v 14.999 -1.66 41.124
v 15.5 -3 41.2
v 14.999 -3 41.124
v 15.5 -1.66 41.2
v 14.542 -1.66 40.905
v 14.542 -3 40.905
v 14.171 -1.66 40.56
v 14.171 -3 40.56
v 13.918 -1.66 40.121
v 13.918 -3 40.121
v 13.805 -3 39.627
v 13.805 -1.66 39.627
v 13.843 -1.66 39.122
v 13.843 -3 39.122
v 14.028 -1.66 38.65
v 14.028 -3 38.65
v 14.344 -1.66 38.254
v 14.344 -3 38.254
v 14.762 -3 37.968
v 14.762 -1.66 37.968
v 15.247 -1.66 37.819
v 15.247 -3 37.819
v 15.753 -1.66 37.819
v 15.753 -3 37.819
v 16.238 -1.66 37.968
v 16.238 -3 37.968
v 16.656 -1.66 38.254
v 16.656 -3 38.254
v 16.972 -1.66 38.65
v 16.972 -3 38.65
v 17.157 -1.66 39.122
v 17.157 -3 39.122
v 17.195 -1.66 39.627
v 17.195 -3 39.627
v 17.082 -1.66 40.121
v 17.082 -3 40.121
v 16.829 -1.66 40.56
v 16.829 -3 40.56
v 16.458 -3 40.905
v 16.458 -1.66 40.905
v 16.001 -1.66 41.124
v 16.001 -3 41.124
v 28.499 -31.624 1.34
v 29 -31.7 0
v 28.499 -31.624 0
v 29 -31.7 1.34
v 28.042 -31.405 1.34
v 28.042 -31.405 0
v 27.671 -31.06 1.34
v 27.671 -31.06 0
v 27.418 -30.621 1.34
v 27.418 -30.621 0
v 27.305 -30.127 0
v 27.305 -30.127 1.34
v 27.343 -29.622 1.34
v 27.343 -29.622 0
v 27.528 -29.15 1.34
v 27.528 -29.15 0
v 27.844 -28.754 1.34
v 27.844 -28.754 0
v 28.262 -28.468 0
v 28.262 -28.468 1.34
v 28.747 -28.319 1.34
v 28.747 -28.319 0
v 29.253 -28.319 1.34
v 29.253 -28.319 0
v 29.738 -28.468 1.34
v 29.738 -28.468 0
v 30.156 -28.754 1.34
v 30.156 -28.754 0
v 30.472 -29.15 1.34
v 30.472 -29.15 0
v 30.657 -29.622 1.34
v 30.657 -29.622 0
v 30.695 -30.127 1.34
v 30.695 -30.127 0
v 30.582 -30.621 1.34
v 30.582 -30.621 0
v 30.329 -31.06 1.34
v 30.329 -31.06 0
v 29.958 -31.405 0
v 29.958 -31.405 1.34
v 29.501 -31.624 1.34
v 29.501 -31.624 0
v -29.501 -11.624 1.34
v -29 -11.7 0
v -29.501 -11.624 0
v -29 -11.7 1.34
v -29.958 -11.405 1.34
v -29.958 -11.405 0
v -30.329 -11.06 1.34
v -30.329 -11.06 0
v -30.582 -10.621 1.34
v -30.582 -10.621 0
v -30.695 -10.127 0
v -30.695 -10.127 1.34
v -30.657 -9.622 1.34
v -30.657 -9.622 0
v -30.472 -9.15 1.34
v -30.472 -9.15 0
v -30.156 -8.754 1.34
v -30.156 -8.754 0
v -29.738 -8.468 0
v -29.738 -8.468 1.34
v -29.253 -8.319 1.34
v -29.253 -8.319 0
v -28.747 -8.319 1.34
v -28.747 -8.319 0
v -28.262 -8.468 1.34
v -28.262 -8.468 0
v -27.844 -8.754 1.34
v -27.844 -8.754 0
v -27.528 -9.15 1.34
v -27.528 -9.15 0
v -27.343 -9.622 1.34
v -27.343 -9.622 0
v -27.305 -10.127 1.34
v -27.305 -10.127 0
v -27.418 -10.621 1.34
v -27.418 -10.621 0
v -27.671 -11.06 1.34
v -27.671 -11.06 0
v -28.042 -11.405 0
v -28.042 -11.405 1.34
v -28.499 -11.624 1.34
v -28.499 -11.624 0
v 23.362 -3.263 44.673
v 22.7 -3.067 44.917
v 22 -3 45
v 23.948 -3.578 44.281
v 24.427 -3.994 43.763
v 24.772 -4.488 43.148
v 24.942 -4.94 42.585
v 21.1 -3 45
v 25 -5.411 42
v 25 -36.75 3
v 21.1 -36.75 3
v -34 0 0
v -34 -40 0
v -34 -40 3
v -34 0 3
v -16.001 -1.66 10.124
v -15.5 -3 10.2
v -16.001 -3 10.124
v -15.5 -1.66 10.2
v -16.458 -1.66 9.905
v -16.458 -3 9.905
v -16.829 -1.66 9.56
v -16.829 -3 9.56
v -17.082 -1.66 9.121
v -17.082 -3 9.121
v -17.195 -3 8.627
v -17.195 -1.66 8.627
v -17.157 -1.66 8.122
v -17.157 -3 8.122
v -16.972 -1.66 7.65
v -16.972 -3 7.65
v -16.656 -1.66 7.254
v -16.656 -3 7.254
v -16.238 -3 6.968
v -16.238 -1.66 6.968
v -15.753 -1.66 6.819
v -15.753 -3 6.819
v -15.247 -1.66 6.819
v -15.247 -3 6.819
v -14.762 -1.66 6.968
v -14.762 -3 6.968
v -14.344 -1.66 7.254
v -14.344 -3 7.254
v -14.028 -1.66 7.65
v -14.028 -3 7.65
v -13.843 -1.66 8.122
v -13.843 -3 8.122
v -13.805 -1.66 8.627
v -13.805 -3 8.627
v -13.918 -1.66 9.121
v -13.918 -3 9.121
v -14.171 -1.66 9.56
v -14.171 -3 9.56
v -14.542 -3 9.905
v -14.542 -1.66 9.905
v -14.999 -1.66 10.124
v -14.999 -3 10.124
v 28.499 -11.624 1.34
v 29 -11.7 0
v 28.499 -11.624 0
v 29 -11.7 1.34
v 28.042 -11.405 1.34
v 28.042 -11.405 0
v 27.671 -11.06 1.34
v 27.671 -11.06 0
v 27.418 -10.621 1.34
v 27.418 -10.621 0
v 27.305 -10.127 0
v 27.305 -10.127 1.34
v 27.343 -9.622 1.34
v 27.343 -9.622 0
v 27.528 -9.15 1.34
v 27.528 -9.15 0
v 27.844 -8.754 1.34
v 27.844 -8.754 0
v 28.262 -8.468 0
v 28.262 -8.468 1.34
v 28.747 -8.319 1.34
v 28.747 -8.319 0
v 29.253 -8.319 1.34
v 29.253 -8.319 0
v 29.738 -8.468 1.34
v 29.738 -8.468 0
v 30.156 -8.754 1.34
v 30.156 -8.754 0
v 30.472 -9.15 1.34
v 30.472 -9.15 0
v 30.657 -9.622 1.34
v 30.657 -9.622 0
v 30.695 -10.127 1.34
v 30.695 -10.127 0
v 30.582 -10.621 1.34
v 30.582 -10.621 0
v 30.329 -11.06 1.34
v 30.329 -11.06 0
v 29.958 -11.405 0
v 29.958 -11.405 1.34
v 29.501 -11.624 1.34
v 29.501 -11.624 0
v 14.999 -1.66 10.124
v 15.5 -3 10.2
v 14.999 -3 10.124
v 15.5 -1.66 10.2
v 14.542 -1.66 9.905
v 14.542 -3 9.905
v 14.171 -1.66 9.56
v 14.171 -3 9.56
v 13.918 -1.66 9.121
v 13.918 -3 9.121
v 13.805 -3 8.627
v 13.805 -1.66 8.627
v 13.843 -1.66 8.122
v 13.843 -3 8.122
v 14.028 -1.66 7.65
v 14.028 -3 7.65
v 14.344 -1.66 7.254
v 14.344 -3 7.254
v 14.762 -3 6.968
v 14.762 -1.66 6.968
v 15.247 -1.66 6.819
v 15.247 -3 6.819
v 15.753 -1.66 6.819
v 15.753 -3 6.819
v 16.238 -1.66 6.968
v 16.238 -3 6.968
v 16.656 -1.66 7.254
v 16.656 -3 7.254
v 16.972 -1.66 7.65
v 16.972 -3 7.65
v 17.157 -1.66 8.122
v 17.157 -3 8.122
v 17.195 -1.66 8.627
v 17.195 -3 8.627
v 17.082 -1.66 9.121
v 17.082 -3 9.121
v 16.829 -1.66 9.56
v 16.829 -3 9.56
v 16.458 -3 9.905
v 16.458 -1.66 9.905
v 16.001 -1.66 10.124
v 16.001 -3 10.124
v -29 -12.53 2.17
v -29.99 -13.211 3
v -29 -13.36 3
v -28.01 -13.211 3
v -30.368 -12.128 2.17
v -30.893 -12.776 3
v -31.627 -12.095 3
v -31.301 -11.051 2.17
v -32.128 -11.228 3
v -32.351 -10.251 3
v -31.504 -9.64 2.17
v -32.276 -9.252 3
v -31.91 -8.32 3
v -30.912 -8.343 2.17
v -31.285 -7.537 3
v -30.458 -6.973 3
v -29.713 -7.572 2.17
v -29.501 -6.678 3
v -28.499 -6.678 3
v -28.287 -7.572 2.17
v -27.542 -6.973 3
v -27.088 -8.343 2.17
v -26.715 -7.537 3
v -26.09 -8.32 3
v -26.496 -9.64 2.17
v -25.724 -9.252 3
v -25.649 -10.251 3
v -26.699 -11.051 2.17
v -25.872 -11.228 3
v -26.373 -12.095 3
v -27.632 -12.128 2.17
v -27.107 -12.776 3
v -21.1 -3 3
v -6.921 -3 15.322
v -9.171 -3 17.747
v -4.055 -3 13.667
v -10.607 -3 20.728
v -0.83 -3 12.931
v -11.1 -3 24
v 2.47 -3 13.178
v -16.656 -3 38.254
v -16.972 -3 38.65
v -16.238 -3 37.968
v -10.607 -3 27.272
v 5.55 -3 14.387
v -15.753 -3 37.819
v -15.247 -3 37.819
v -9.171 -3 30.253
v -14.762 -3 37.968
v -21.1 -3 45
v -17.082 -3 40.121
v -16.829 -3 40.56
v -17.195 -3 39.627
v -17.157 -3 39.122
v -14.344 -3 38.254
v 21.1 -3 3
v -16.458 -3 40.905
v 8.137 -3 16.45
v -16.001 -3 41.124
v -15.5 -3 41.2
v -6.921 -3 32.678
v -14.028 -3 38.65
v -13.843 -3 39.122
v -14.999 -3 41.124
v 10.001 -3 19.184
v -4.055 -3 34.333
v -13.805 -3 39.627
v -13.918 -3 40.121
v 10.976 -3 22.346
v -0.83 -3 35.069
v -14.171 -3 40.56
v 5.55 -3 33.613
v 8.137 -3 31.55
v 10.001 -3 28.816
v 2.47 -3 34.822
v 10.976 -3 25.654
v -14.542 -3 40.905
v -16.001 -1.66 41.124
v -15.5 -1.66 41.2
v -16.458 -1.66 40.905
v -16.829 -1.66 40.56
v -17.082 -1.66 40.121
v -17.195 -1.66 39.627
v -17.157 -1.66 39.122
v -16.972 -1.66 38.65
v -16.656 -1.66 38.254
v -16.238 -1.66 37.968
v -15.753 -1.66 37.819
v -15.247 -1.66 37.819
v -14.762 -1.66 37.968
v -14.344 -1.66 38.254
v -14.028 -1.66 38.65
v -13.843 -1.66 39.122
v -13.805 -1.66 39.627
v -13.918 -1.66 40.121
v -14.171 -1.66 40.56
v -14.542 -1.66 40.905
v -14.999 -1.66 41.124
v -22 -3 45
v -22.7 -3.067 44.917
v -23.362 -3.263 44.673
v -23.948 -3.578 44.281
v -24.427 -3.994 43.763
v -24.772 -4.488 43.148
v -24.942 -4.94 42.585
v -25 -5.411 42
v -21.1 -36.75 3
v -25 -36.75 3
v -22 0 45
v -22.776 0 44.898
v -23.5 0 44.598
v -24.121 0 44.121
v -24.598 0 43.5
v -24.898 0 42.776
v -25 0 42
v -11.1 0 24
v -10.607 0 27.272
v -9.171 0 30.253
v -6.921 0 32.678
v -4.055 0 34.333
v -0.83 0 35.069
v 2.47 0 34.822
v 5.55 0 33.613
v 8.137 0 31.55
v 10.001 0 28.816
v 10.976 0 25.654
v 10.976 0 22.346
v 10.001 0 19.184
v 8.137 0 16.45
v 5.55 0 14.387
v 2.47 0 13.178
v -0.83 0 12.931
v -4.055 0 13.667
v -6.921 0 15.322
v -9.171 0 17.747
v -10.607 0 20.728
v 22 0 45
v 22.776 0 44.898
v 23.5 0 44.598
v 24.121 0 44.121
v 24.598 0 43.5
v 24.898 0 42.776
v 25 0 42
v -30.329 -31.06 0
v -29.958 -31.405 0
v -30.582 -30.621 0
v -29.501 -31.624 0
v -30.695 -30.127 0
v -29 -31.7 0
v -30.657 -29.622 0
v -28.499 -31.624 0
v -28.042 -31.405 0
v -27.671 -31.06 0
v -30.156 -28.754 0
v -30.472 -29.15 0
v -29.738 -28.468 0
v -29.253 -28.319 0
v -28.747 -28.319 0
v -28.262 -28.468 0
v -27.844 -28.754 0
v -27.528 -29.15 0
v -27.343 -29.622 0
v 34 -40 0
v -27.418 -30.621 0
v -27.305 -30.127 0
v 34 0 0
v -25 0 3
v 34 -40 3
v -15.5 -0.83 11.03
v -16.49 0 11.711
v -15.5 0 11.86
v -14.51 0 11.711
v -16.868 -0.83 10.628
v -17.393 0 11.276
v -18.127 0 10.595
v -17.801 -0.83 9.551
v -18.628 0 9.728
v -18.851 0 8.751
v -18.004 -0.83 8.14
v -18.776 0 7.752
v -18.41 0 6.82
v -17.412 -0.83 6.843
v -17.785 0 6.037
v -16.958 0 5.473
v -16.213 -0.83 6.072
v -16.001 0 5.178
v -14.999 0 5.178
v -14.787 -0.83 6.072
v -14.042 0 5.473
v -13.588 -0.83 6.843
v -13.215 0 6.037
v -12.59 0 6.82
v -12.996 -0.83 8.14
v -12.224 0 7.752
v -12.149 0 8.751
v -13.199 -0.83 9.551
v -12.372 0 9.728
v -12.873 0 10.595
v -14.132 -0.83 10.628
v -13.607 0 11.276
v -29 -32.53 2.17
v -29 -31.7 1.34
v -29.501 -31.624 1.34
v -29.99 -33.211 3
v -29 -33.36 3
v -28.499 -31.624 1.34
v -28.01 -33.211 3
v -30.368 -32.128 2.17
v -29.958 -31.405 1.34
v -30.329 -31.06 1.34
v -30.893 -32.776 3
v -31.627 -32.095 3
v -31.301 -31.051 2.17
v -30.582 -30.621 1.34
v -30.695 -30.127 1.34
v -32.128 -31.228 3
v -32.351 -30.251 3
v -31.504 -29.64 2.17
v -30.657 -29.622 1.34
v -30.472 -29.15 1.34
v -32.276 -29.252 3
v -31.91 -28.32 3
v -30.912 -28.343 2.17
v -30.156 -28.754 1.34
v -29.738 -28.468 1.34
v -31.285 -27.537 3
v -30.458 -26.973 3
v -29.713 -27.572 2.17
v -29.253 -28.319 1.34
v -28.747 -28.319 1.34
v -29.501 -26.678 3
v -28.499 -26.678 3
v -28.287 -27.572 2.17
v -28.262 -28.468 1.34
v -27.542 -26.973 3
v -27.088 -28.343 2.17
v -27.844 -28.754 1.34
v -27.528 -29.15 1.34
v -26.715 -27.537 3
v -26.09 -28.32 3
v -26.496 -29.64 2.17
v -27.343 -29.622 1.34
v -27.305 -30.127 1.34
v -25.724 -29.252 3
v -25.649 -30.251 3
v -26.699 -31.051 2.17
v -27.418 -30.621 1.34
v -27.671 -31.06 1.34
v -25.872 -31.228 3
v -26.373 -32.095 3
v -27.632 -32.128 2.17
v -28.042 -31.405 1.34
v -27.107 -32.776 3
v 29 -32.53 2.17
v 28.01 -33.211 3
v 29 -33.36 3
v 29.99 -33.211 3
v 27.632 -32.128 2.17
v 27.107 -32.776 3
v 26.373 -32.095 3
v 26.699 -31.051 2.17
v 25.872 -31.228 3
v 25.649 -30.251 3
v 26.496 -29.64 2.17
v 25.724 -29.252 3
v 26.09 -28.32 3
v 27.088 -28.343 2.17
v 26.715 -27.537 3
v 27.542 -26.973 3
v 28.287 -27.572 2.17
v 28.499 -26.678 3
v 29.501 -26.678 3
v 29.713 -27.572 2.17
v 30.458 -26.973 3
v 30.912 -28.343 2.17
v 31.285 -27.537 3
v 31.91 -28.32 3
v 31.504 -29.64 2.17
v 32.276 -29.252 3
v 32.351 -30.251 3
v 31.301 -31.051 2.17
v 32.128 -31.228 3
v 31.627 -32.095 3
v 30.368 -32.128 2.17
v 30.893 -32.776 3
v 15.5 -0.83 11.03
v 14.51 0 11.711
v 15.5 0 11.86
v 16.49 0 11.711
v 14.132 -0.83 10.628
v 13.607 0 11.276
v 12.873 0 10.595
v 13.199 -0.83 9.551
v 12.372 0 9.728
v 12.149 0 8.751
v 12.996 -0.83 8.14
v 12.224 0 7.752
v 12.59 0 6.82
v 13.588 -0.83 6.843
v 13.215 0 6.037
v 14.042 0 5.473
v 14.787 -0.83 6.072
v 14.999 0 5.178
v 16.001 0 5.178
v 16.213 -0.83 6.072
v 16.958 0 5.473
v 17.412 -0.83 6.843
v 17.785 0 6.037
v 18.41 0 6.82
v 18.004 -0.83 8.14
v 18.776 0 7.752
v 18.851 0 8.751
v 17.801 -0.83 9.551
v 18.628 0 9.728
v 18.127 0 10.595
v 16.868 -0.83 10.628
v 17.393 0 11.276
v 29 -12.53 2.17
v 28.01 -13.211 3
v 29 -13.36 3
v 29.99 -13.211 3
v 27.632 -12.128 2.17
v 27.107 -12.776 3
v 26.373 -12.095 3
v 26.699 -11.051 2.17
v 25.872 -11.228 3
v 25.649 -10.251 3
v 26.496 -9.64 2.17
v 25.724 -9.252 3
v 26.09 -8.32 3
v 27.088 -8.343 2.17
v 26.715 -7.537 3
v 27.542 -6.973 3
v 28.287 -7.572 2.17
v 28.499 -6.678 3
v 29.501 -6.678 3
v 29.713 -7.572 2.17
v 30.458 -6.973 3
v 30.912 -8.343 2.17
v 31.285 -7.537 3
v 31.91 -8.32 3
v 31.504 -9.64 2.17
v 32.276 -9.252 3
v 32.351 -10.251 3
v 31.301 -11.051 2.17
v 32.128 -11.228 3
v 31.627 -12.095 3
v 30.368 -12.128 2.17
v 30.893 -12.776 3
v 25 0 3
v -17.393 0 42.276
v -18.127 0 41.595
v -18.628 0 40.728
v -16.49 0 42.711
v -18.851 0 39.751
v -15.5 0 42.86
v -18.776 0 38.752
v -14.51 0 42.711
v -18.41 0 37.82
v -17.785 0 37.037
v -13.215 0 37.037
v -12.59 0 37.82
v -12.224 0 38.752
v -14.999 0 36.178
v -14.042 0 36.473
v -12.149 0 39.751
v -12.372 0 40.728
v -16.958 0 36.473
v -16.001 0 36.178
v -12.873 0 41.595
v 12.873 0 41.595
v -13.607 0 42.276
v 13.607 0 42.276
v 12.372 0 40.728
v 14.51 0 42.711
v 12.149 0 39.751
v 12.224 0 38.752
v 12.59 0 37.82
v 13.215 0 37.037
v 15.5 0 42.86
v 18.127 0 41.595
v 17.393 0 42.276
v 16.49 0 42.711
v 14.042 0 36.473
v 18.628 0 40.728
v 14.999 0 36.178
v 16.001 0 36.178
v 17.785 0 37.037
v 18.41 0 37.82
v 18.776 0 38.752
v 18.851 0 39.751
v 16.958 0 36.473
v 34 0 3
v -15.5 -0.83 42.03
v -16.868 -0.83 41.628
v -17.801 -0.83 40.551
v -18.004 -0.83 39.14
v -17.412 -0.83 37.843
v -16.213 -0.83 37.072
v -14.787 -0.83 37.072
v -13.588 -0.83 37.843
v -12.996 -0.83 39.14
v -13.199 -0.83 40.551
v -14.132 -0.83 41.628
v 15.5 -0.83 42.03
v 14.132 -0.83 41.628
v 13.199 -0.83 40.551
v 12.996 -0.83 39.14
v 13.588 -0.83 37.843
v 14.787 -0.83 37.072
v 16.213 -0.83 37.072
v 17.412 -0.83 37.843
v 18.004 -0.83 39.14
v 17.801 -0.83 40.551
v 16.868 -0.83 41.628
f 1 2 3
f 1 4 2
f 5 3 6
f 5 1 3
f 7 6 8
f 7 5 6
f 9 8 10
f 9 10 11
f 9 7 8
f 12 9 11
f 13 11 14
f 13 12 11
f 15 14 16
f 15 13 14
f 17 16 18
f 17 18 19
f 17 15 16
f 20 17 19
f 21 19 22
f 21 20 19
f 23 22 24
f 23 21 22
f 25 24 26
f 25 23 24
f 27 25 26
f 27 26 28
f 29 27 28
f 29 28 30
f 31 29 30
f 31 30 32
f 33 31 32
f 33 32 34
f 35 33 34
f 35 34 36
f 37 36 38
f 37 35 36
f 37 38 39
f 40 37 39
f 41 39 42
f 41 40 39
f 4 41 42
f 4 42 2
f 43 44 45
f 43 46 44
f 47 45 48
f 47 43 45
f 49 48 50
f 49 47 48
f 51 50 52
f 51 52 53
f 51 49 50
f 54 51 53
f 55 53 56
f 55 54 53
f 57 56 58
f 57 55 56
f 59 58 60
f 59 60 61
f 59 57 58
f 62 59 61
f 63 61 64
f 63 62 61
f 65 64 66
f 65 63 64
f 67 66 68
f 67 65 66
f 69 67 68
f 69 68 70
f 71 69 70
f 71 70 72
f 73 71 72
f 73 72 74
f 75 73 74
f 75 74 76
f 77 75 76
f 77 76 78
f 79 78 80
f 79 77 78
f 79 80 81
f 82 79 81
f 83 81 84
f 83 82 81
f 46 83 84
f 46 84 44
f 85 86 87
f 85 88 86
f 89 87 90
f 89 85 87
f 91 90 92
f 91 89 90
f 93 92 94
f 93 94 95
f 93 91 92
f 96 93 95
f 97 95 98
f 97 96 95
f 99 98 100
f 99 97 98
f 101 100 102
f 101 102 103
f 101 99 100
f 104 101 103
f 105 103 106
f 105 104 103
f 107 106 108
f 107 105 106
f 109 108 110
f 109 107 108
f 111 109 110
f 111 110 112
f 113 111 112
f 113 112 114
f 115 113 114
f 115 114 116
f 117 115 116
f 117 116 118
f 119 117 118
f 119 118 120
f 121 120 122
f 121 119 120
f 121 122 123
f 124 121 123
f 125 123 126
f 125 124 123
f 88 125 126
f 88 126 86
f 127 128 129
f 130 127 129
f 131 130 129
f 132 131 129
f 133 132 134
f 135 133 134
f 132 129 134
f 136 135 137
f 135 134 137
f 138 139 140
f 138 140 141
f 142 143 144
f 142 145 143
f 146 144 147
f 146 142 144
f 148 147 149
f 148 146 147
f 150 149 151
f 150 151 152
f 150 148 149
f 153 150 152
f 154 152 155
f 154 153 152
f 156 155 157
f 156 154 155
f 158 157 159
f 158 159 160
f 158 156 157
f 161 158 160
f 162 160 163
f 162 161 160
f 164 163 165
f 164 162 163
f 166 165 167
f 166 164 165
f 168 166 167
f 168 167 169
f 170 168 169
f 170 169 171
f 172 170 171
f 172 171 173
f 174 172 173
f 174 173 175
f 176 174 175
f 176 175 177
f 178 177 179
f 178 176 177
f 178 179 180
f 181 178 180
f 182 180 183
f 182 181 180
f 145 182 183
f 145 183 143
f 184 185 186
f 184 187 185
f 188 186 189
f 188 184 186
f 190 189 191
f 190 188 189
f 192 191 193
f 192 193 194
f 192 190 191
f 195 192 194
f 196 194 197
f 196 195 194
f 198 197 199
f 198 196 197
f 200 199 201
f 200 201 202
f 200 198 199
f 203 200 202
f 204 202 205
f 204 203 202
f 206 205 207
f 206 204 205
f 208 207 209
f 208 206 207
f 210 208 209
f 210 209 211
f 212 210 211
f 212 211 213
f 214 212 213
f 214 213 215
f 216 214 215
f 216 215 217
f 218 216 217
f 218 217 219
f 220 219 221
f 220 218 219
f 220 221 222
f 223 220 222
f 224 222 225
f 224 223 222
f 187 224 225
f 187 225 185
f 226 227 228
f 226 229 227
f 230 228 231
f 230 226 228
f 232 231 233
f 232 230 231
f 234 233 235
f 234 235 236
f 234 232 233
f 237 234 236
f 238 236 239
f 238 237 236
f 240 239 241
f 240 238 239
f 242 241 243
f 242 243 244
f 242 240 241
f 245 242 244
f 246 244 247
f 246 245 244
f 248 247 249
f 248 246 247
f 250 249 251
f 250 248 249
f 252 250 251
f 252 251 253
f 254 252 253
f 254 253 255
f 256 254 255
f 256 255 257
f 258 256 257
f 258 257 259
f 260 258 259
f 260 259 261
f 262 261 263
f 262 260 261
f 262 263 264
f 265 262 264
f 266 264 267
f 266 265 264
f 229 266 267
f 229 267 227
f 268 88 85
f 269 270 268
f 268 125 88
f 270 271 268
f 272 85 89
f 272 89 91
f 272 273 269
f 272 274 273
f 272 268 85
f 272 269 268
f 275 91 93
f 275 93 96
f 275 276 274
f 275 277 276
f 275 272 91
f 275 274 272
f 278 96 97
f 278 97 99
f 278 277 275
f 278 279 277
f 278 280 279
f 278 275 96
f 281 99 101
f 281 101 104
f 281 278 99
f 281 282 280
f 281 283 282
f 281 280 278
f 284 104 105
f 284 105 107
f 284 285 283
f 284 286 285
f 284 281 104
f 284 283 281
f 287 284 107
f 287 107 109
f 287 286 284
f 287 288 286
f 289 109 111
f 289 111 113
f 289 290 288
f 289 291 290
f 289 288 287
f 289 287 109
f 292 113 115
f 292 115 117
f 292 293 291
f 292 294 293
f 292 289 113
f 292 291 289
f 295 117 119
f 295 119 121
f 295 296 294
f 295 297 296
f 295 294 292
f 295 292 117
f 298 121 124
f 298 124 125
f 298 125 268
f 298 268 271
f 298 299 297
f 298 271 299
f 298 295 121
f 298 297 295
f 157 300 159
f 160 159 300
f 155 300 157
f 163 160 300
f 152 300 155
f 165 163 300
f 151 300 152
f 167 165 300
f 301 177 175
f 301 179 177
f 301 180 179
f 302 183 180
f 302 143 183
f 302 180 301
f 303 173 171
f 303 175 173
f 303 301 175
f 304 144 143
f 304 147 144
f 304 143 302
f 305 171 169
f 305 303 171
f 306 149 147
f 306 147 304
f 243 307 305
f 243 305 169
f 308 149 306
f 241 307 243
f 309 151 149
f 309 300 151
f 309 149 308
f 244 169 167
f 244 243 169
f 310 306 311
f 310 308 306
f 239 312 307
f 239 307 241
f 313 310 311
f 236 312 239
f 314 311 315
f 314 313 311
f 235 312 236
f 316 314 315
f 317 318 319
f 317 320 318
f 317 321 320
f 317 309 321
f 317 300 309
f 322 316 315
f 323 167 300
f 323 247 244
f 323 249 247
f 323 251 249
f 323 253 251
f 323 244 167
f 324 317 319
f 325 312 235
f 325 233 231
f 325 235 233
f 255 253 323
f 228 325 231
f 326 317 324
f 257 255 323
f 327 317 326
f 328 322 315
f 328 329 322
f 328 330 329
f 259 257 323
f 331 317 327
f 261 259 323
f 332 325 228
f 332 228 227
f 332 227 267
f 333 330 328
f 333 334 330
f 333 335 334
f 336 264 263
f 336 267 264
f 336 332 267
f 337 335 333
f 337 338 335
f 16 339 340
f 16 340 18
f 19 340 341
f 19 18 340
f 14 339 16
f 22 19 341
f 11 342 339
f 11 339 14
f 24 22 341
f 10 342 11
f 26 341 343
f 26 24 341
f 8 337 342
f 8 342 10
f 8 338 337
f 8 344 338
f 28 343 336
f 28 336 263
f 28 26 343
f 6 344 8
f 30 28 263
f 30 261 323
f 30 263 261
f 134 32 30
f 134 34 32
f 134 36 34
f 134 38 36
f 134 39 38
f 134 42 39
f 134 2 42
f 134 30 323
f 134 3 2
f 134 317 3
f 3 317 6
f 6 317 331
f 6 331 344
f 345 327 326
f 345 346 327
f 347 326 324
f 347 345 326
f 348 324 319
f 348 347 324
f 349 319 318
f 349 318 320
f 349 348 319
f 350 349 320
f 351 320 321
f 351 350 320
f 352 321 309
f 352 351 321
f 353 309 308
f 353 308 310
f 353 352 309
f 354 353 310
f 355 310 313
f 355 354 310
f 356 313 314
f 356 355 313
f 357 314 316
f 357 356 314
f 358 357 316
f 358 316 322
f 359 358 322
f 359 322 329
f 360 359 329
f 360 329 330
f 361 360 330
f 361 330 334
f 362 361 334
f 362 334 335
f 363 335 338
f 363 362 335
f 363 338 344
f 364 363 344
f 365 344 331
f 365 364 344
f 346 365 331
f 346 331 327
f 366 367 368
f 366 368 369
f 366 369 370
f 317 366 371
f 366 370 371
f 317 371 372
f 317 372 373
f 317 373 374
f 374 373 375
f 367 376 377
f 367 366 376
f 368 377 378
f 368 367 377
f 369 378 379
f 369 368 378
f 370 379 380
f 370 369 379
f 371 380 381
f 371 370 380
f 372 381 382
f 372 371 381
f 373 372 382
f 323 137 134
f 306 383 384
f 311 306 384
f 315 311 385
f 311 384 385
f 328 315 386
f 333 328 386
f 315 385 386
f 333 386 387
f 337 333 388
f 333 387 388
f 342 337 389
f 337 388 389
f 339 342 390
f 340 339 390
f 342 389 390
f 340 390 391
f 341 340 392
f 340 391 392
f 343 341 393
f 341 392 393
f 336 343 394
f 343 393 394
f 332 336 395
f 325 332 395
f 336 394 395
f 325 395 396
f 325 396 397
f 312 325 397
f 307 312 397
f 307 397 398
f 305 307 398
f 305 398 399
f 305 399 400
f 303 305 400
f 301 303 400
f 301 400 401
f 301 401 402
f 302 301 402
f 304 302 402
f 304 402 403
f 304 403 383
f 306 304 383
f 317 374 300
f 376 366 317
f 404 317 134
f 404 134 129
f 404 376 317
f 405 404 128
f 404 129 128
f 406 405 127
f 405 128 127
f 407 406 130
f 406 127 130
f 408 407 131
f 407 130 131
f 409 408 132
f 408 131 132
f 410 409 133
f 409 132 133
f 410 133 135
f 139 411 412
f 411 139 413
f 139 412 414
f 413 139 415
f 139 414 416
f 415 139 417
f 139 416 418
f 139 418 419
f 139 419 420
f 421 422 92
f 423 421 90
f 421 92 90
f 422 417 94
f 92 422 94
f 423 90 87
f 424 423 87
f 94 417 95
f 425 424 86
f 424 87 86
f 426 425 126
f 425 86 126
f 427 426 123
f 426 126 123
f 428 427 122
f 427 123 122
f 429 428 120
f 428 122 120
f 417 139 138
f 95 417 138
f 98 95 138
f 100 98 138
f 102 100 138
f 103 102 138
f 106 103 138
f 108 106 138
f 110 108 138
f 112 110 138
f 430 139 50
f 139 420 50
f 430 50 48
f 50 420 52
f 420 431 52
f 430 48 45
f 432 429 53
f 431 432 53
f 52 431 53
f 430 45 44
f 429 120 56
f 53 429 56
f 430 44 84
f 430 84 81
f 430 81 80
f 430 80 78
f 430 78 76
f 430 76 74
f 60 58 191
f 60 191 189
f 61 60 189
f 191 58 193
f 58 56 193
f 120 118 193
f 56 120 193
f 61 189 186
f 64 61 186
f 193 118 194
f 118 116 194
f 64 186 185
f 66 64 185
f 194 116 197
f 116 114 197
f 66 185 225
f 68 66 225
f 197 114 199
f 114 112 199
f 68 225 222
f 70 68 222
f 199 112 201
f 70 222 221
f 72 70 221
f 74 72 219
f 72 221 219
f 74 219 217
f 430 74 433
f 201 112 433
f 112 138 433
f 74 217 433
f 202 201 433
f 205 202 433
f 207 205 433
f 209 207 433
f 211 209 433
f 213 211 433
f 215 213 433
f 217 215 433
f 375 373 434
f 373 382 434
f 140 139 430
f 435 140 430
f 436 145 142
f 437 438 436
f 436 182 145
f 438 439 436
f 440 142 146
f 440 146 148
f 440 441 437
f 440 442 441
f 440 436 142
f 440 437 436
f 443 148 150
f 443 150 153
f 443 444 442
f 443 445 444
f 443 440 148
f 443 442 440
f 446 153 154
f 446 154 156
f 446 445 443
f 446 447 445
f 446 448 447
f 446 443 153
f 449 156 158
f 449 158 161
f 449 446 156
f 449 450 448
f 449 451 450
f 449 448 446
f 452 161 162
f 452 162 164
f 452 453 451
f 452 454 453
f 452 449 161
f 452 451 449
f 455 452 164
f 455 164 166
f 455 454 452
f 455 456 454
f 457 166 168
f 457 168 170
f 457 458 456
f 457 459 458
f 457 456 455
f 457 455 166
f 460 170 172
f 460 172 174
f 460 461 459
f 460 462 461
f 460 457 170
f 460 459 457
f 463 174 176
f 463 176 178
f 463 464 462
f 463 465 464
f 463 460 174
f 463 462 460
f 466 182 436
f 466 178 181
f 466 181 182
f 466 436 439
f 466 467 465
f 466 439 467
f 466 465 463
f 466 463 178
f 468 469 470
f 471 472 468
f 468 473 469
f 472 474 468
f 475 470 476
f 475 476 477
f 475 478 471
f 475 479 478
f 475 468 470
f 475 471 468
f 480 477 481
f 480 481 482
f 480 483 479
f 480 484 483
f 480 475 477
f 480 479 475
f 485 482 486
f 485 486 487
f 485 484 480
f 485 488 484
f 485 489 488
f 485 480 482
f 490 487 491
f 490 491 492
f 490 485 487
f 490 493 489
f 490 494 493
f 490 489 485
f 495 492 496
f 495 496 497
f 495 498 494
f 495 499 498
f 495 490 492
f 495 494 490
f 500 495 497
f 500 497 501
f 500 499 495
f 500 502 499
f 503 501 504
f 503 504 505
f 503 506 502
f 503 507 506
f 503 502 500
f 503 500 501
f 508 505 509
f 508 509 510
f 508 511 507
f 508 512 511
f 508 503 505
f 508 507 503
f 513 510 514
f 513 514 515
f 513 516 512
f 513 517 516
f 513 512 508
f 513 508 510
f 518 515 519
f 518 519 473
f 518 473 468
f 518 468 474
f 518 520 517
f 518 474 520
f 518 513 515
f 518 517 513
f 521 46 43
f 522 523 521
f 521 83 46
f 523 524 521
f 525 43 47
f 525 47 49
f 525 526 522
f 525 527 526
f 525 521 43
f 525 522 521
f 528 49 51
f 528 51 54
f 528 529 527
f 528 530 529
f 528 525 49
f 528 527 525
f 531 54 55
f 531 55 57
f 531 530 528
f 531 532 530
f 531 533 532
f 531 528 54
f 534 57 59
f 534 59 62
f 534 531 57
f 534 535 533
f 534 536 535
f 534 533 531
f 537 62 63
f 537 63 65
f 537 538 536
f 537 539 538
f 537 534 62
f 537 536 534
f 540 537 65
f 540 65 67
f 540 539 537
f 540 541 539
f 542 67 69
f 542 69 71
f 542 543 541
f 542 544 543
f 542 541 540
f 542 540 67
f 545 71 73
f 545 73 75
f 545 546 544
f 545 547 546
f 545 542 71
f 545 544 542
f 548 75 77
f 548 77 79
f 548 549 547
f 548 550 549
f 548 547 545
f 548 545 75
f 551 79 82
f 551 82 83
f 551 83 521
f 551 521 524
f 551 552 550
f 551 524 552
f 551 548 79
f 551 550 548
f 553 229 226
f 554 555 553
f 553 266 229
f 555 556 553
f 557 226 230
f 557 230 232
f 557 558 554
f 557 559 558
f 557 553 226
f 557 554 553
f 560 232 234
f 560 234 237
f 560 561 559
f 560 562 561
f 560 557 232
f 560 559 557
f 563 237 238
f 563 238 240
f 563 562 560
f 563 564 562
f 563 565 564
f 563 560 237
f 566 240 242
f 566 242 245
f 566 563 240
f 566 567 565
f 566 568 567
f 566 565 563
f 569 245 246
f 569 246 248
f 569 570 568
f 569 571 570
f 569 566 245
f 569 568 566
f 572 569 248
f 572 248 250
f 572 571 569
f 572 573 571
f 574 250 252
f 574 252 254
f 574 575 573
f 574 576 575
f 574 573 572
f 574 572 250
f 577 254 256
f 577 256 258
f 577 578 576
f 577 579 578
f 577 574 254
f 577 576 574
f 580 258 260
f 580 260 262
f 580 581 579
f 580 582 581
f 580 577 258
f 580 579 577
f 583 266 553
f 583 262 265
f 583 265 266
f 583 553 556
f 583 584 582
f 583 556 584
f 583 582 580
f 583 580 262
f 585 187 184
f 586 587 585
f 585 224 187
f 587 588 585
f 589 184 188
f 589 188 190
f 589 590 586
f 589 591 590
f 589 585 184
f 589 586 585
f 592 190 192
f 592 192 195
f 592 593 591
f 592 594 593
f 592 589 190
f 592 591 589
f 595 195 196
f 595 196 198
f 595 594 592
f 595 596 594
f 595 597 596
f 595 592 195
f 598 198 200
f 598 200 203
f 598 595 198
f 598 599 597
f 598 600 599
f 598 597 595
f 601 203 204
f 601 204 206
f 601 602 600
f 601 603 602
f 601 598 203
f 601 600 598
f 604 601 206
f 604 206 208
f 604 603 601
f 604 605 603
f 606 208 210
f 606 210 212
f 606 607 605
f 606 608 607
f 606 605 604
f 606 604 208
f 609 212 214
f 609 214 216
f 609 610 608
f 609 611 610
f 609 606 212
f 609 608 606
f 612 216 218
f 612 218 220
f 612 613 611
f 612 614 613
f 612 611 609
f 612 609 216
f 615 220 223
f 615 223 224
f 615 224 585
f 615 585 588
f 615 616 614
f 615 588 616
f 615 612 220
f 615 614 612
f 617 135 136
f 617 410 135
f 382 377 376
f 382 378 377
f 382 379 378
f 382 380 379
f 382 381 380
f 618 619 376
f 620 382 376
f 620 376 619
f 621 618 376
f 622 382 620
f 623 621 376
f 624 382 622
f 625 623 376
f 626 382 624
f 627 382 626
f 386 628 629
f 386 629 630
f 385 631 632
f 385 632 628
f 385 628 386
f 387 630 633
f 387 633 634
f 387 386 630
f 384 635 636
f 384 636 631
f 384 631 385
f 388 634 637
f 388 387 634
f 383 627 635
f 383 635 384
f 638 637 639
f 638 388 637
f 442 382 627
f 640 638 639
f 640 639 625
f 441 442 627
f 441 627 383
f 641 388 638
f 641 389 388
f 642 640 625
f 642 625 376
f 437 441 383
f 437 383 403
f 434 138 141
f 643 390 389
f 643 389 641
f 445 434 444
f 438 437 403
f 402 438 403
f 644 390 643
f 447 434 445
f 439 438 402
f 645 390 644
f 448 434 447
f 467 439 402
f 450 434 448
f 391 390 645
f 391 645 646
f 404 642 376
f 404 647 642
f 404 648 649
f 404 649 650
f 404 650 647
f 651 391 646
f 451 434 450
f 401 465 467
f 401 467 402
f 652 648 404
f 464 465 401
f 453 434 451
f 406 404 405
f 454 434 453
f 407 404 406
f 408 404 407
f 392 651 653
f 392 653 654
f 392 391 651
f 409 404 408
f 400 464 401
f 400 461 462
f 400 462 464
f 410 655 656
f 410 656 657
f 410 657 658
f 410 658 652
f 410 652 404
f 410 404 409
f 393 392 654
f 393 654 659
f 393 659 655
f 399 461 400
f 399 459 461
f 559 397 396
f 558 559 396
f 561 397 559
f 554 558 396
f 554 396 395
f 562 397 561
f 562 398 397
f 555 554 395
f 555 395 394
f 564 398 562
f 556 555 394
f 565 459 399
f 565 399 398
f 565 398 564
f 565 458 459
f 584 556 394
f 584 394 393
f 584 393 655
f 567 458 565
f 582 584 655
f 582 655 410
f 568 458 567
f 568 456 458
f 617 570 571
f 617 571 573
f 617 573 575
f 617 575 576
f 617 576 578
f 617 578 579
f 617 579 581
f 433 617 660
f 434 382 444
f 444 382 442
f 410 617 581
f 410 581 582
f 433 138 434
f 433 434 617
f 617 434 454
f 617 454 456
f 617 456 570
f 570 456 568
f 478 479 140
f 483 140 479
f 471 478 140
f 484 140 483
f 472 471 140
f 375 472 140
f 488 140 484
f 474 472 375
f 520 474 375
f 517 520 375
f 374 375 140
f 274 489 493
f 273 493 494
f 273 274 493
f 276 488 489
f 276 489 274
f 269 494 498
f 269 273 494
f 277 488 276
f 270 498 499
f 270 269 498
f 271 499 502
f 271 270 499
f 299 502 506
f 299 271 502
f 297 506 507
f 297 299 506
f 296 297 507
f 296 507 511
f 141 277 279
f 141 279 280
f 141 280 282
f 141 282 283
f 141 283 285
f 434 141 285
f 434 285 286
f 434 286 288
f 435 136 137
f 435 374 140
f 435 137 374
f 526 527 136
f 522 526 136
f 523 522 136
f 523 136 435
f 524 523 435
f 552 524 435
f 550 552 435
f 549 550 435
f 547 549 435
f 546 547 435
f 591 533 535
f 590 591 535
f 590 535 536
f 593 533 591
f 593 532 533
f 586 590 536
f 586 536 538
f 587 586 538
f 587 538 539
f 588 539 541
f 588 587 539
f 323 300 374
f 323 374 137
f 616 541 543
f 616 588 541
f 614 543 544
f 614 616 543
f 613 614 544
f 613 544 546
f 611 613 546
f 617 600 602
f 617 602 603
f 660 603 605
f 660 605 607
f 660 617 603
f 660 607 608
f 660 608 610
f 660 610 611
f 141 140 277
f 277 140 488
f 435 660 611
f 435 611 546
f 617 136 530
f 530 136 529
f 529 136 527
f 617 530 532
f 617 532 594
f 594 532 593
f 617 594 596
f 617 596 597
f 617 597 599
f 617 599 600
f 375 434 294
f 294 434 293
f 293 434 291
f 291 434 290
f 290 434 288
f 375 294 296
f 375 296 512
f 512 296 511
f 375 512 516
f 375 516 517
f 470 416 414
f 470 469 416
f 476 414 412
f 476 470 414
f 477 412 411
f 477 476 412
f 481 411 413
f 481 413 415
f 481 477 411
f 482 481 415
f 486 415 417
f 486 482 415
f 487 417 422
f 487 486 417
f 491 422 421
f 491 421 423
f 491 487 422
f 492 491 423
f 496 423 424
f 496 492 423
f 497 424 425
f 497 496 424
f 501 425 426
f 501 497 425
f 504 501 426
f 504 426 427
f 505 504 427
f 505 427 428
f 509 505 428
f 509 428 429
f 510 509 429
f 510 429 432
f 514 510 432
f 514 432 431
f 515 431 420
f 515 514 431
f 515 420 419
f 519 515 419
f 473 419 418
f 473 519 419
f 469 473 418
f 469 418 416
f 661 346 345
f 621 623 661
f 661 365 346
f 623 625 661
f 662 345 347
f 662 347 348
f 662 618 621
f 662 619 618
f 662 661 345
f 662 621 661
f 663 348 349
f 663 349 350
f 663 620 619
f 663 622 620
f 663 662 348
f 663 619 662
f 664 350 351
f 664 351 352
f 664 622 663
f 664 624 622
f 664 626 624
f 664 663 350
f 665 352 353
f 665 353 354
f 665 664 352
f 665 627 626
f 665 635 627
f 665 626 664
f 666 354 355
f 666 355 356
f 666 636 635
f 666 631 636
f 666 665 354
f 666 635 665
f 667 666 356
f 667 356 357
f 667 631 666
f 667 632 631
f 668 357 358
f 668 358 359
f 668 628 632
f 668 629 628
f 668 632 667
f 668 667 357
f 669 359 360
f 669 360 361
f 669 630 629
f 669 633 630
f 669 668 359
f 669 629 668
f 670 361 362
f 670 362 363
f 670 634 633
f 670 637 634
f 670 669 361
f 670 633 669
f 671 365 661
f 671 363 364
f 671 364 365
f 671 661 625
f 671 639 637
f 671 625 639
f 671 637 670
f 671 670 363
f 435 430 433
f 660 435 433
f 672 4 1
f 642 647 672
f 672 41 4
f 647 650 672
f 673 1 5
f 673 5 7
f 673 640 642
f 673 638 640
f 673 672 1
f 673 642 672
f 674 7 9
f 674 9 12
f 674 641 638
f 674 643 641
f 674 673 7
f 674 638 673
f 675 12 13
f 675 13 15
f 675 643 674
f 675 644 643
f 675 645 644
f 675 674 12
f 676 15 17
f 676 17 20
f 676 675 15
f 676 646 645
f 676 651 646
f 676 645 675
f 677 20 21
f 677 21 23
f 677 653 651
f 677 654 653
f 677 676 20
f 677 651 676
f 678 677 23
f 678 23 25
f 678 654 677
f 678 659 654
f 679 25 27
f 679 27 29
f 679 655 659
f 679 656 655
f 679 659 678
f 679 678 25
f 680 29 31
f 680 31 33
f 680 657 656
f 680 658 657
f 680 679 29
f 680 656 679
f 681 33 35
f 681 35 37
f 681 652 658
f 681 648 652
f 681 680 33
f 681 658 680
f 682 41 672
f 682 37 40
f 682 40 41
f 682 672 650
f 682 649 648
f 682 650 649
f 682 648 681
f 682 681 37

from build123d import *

# Parameters (mm, degrees)
SKETCH1_W                    = 68
SKETCH1_H                    = 40
BOSS_EXTRUDE1_DEPTH          = 3
SKETCH3_W                    = 50
SKETCH3_H                    = 42
BOSS_EXTRUDE2_DEPTH          = 3
CUT_EXTRUDE1_REACH           = 71.145
SKETCH4_R                    = 11.1
CSK_FOR_M3_SFHCS1_AT_2_COUNT = 2
CSK_FOR_M3_SFHCS1_AT_2_PITCH = 31
CSK_FOR_M3_SFHCS1_AT_3_COUNT = 2
CSK_FOR_M3_SFHCS1_AT_3_PITCH = 31
CSK_FOR_M3_SFHCS1_AT_4_COUNT = 2
CSK_FOR_M3_SFHCS1_AT_4_PITCH = 43.840620434
BOSS_EXTRUDE3_DEPTH          = 50
SKETCH9_W                    = 42.2
SKETCH9_H                    = 42
CUT_EXTRUDE2_DEPTH           = 37
FILLET1_R                    = 3
CSK_FOR_M3_SFHCS2_AT_2_COUNT = 2
CSK_FOR_M3_SFHCS2_AT_2_PITCH = 61.351446601
CSK_FOR_M3_SFHCS2_AT_3_COUNT = 2
CSK_FOR_M3_SFHCS2_AT_3_PITCH = 20
CSK_FOR_M3_SFHCS2_AT_4_COUNT = 2
CSK_FOR_M3_SFHCS2_AT_4_PITCH = 58


with BuildPart() as part:
    # Sketch1 → Boss-Extrude1 (new body)
    with BuildSketch(Plane.XY):
        with Locations((0, -20)):
            Rectangle(SKETCH1_W, SKETCH1_H)
    extrude(amount=BOSS_EXTRUDE1_DEPTH)

    # Sketch3 → Boss-Extrude2 (add)
    with BuildSketch(Plane(origin=(0, 0, 0), x_dir=(1, 0, 0), z_dir=(0, 1, 0))):
        with Locations((0, -24)):
            Rectangle(SKETCH3_W, SKETCH3_H)
    extrude(amount=-BOSS_EXTRUDE2_DEPTH)

    # Sketch4 → Cut-Extrude1 (cut, up to next)
    with BuildSketch(Plane(origin=(0, 0, 0), x_dir=(1, 0, 0), z_dir=(0, 1, 0)), mode=Mode.PRIVATE) as cut_extrude1_sk1:
        with Locations(Location((0, -24, 0), (0, 0, 180))):
            Circle(SKETCH4_R)
    cut_extrude1_tool1 = extrude(cut_extrude1_sk1.sketch, amount=-CUT_EXTRUDE1_REACH, mode=Mode.PRIVATE) & part.part
    add(cut_extrude1_tool1.solids().sort_by_distance((0, 0, 24))[0], mode=Mode.SUBTRACT)

    # Sketch6 → CSK for M3 SFHCS1 (revolve, cut)
    with BuildSketch(Plane(origin=(-15.5, 0, 8.5), x_dir=(0, 0, 1), z_dir=(1, 0, 0))):
        Polygon((0, 0), (0, 3), (1.7, 3), (1.7, 1.66), (3.36, 0), align=None)
    csk_for_m3_sfhcs1 = revolve(axis=Axis((-15.5, 6.35, 8.5), (0, -1, 0)), mode=Mode.SUBTRACT)

    # CSK for M3 SFHCS1 at 2: CSK for M3 SFHCS1 ×2
    with Locations(*[(i * CSK_FOR_M3_SFHCS1_AT_2_PITCH, 0, 0) for i in range(1, CSK_FOR_M3_SFHCS1_AT_2_COUNT)]):
        add(csk_for_m3_sfhcs1, mode=Mode.SUBTRACT)

    # CSK for M3 SFHCS1 at 3: CSK for M3 SFHCS1 ×2
    with Locations(*[(0, 0, i * CSK_FOR_M3_SFHCS1_AT_3_PITCH) for i in range(1, CSK_FOR_M3_SFHCS1_AT_3_COUNT)]):
        add(csk_for_m3_sfhcs1, mode=Mode.SUBTRACT)

    # CSK for M3 SFHCS1 at 4: CSK for M3 SFHCS1 ×2
    with Locations(*[Vector(0.7071067811865476, 0, 0.7071067811865476) * (i * CSK_FOR_M3_SFHCS1_AT_4_PITCH) for i in range(1, CSK_FOR_M3_SFHCS1_AT_4_COUNT)]):
        add(csk_for_m3_sfhcs1, mode=Mode.SUBTRACT)

    # Sketch7 → Boss-Extrude3 (add)
    with BuildSketch(Plane.ZY.offset(25)):
        Polygon((45, -3), (3, -36.75), (3, -3), align=None)
    extrude(amount=-BOSS_EXTRUDE3_DEPTH)

    # Sketch9 → Cut-Extrude2 (cut)
    with BuildSketch(Plane.XZ.offset(40)):
        with Locations((0, 24)):
            Rectangle(SKETCH9_W, SKETCH9_H)
    extrude(amount=-CUT_EXTRUDE2_DEPTH, mode=Mode.SUBTRACT)

    # Fillet1
    fillet1_edges = [part.edges().sort_by_distance(p)[0] for p in [
        (-25, -1.5, 45),
        (25, -1.5, 45),
    ]]
    fillet(fillet1_edges, radius=FILLET1_R)

    # Sketch11 → CSK for M3 SFHCS2 (revolve, cut)
    with BuildSketch(Plane(origin=(-29, -30, 3), x_dir=(0, -1, 0), z_dir=(1, 0, 0))):
        Polygon((0, 0), (0, 3), (1.7, 3), (1.7, 1.66), (3.36, 0), align=None)
    csk_for_m3_sfhcs2 = revolve(axis=Axis((-29, -30, 9.35), (0, 0, -1)), mode=Mode.SUBTRACT)

    # CSK for M3 SFHCS2 at 2: CSK for M3 SFHCS2 ×2
    with Locations(*[Vector(0.9453729816262721, 0.32599068331940423, 0) * (i * CSK_FOR_M3_SFHCS2_AT_2_PITCH) for i in range(1, CSK_FOR_M3_SFHCS2_AT_2_COUNT)]):
        add(csk_for_m3_sfhcs2, mode=Mode.SUBTRACT)

    # CSK for M3 SFHCS2 at 3: CSK for M3 SFHCS2 ×2
    with Locations(*[(0, i * CSK_FOR_M3_SFHCS2_AT_3_PITCH, 0) for i in range(1, CSK_FOR_M3_SFHCS2_AT_3_COUNT)]):
        add(csk_for_m3_sfhcs2, mode=Mode.SUBTRACT)

    # CSK for M3 SFHCS2 at 4: CSK for M3 SFHCS2 ×2
    with Locations(*[(i * CSK_FOR_M3_SFHCS2_AT_4_PITCH, 0, 0) for i in range(1, CSK_FOR_M3_SFHCS2_AT_4_COUNT)]):
        add(csk_for_m3_sfhcs2, mode=Mode.SUBTRACT)


solid = part.part
